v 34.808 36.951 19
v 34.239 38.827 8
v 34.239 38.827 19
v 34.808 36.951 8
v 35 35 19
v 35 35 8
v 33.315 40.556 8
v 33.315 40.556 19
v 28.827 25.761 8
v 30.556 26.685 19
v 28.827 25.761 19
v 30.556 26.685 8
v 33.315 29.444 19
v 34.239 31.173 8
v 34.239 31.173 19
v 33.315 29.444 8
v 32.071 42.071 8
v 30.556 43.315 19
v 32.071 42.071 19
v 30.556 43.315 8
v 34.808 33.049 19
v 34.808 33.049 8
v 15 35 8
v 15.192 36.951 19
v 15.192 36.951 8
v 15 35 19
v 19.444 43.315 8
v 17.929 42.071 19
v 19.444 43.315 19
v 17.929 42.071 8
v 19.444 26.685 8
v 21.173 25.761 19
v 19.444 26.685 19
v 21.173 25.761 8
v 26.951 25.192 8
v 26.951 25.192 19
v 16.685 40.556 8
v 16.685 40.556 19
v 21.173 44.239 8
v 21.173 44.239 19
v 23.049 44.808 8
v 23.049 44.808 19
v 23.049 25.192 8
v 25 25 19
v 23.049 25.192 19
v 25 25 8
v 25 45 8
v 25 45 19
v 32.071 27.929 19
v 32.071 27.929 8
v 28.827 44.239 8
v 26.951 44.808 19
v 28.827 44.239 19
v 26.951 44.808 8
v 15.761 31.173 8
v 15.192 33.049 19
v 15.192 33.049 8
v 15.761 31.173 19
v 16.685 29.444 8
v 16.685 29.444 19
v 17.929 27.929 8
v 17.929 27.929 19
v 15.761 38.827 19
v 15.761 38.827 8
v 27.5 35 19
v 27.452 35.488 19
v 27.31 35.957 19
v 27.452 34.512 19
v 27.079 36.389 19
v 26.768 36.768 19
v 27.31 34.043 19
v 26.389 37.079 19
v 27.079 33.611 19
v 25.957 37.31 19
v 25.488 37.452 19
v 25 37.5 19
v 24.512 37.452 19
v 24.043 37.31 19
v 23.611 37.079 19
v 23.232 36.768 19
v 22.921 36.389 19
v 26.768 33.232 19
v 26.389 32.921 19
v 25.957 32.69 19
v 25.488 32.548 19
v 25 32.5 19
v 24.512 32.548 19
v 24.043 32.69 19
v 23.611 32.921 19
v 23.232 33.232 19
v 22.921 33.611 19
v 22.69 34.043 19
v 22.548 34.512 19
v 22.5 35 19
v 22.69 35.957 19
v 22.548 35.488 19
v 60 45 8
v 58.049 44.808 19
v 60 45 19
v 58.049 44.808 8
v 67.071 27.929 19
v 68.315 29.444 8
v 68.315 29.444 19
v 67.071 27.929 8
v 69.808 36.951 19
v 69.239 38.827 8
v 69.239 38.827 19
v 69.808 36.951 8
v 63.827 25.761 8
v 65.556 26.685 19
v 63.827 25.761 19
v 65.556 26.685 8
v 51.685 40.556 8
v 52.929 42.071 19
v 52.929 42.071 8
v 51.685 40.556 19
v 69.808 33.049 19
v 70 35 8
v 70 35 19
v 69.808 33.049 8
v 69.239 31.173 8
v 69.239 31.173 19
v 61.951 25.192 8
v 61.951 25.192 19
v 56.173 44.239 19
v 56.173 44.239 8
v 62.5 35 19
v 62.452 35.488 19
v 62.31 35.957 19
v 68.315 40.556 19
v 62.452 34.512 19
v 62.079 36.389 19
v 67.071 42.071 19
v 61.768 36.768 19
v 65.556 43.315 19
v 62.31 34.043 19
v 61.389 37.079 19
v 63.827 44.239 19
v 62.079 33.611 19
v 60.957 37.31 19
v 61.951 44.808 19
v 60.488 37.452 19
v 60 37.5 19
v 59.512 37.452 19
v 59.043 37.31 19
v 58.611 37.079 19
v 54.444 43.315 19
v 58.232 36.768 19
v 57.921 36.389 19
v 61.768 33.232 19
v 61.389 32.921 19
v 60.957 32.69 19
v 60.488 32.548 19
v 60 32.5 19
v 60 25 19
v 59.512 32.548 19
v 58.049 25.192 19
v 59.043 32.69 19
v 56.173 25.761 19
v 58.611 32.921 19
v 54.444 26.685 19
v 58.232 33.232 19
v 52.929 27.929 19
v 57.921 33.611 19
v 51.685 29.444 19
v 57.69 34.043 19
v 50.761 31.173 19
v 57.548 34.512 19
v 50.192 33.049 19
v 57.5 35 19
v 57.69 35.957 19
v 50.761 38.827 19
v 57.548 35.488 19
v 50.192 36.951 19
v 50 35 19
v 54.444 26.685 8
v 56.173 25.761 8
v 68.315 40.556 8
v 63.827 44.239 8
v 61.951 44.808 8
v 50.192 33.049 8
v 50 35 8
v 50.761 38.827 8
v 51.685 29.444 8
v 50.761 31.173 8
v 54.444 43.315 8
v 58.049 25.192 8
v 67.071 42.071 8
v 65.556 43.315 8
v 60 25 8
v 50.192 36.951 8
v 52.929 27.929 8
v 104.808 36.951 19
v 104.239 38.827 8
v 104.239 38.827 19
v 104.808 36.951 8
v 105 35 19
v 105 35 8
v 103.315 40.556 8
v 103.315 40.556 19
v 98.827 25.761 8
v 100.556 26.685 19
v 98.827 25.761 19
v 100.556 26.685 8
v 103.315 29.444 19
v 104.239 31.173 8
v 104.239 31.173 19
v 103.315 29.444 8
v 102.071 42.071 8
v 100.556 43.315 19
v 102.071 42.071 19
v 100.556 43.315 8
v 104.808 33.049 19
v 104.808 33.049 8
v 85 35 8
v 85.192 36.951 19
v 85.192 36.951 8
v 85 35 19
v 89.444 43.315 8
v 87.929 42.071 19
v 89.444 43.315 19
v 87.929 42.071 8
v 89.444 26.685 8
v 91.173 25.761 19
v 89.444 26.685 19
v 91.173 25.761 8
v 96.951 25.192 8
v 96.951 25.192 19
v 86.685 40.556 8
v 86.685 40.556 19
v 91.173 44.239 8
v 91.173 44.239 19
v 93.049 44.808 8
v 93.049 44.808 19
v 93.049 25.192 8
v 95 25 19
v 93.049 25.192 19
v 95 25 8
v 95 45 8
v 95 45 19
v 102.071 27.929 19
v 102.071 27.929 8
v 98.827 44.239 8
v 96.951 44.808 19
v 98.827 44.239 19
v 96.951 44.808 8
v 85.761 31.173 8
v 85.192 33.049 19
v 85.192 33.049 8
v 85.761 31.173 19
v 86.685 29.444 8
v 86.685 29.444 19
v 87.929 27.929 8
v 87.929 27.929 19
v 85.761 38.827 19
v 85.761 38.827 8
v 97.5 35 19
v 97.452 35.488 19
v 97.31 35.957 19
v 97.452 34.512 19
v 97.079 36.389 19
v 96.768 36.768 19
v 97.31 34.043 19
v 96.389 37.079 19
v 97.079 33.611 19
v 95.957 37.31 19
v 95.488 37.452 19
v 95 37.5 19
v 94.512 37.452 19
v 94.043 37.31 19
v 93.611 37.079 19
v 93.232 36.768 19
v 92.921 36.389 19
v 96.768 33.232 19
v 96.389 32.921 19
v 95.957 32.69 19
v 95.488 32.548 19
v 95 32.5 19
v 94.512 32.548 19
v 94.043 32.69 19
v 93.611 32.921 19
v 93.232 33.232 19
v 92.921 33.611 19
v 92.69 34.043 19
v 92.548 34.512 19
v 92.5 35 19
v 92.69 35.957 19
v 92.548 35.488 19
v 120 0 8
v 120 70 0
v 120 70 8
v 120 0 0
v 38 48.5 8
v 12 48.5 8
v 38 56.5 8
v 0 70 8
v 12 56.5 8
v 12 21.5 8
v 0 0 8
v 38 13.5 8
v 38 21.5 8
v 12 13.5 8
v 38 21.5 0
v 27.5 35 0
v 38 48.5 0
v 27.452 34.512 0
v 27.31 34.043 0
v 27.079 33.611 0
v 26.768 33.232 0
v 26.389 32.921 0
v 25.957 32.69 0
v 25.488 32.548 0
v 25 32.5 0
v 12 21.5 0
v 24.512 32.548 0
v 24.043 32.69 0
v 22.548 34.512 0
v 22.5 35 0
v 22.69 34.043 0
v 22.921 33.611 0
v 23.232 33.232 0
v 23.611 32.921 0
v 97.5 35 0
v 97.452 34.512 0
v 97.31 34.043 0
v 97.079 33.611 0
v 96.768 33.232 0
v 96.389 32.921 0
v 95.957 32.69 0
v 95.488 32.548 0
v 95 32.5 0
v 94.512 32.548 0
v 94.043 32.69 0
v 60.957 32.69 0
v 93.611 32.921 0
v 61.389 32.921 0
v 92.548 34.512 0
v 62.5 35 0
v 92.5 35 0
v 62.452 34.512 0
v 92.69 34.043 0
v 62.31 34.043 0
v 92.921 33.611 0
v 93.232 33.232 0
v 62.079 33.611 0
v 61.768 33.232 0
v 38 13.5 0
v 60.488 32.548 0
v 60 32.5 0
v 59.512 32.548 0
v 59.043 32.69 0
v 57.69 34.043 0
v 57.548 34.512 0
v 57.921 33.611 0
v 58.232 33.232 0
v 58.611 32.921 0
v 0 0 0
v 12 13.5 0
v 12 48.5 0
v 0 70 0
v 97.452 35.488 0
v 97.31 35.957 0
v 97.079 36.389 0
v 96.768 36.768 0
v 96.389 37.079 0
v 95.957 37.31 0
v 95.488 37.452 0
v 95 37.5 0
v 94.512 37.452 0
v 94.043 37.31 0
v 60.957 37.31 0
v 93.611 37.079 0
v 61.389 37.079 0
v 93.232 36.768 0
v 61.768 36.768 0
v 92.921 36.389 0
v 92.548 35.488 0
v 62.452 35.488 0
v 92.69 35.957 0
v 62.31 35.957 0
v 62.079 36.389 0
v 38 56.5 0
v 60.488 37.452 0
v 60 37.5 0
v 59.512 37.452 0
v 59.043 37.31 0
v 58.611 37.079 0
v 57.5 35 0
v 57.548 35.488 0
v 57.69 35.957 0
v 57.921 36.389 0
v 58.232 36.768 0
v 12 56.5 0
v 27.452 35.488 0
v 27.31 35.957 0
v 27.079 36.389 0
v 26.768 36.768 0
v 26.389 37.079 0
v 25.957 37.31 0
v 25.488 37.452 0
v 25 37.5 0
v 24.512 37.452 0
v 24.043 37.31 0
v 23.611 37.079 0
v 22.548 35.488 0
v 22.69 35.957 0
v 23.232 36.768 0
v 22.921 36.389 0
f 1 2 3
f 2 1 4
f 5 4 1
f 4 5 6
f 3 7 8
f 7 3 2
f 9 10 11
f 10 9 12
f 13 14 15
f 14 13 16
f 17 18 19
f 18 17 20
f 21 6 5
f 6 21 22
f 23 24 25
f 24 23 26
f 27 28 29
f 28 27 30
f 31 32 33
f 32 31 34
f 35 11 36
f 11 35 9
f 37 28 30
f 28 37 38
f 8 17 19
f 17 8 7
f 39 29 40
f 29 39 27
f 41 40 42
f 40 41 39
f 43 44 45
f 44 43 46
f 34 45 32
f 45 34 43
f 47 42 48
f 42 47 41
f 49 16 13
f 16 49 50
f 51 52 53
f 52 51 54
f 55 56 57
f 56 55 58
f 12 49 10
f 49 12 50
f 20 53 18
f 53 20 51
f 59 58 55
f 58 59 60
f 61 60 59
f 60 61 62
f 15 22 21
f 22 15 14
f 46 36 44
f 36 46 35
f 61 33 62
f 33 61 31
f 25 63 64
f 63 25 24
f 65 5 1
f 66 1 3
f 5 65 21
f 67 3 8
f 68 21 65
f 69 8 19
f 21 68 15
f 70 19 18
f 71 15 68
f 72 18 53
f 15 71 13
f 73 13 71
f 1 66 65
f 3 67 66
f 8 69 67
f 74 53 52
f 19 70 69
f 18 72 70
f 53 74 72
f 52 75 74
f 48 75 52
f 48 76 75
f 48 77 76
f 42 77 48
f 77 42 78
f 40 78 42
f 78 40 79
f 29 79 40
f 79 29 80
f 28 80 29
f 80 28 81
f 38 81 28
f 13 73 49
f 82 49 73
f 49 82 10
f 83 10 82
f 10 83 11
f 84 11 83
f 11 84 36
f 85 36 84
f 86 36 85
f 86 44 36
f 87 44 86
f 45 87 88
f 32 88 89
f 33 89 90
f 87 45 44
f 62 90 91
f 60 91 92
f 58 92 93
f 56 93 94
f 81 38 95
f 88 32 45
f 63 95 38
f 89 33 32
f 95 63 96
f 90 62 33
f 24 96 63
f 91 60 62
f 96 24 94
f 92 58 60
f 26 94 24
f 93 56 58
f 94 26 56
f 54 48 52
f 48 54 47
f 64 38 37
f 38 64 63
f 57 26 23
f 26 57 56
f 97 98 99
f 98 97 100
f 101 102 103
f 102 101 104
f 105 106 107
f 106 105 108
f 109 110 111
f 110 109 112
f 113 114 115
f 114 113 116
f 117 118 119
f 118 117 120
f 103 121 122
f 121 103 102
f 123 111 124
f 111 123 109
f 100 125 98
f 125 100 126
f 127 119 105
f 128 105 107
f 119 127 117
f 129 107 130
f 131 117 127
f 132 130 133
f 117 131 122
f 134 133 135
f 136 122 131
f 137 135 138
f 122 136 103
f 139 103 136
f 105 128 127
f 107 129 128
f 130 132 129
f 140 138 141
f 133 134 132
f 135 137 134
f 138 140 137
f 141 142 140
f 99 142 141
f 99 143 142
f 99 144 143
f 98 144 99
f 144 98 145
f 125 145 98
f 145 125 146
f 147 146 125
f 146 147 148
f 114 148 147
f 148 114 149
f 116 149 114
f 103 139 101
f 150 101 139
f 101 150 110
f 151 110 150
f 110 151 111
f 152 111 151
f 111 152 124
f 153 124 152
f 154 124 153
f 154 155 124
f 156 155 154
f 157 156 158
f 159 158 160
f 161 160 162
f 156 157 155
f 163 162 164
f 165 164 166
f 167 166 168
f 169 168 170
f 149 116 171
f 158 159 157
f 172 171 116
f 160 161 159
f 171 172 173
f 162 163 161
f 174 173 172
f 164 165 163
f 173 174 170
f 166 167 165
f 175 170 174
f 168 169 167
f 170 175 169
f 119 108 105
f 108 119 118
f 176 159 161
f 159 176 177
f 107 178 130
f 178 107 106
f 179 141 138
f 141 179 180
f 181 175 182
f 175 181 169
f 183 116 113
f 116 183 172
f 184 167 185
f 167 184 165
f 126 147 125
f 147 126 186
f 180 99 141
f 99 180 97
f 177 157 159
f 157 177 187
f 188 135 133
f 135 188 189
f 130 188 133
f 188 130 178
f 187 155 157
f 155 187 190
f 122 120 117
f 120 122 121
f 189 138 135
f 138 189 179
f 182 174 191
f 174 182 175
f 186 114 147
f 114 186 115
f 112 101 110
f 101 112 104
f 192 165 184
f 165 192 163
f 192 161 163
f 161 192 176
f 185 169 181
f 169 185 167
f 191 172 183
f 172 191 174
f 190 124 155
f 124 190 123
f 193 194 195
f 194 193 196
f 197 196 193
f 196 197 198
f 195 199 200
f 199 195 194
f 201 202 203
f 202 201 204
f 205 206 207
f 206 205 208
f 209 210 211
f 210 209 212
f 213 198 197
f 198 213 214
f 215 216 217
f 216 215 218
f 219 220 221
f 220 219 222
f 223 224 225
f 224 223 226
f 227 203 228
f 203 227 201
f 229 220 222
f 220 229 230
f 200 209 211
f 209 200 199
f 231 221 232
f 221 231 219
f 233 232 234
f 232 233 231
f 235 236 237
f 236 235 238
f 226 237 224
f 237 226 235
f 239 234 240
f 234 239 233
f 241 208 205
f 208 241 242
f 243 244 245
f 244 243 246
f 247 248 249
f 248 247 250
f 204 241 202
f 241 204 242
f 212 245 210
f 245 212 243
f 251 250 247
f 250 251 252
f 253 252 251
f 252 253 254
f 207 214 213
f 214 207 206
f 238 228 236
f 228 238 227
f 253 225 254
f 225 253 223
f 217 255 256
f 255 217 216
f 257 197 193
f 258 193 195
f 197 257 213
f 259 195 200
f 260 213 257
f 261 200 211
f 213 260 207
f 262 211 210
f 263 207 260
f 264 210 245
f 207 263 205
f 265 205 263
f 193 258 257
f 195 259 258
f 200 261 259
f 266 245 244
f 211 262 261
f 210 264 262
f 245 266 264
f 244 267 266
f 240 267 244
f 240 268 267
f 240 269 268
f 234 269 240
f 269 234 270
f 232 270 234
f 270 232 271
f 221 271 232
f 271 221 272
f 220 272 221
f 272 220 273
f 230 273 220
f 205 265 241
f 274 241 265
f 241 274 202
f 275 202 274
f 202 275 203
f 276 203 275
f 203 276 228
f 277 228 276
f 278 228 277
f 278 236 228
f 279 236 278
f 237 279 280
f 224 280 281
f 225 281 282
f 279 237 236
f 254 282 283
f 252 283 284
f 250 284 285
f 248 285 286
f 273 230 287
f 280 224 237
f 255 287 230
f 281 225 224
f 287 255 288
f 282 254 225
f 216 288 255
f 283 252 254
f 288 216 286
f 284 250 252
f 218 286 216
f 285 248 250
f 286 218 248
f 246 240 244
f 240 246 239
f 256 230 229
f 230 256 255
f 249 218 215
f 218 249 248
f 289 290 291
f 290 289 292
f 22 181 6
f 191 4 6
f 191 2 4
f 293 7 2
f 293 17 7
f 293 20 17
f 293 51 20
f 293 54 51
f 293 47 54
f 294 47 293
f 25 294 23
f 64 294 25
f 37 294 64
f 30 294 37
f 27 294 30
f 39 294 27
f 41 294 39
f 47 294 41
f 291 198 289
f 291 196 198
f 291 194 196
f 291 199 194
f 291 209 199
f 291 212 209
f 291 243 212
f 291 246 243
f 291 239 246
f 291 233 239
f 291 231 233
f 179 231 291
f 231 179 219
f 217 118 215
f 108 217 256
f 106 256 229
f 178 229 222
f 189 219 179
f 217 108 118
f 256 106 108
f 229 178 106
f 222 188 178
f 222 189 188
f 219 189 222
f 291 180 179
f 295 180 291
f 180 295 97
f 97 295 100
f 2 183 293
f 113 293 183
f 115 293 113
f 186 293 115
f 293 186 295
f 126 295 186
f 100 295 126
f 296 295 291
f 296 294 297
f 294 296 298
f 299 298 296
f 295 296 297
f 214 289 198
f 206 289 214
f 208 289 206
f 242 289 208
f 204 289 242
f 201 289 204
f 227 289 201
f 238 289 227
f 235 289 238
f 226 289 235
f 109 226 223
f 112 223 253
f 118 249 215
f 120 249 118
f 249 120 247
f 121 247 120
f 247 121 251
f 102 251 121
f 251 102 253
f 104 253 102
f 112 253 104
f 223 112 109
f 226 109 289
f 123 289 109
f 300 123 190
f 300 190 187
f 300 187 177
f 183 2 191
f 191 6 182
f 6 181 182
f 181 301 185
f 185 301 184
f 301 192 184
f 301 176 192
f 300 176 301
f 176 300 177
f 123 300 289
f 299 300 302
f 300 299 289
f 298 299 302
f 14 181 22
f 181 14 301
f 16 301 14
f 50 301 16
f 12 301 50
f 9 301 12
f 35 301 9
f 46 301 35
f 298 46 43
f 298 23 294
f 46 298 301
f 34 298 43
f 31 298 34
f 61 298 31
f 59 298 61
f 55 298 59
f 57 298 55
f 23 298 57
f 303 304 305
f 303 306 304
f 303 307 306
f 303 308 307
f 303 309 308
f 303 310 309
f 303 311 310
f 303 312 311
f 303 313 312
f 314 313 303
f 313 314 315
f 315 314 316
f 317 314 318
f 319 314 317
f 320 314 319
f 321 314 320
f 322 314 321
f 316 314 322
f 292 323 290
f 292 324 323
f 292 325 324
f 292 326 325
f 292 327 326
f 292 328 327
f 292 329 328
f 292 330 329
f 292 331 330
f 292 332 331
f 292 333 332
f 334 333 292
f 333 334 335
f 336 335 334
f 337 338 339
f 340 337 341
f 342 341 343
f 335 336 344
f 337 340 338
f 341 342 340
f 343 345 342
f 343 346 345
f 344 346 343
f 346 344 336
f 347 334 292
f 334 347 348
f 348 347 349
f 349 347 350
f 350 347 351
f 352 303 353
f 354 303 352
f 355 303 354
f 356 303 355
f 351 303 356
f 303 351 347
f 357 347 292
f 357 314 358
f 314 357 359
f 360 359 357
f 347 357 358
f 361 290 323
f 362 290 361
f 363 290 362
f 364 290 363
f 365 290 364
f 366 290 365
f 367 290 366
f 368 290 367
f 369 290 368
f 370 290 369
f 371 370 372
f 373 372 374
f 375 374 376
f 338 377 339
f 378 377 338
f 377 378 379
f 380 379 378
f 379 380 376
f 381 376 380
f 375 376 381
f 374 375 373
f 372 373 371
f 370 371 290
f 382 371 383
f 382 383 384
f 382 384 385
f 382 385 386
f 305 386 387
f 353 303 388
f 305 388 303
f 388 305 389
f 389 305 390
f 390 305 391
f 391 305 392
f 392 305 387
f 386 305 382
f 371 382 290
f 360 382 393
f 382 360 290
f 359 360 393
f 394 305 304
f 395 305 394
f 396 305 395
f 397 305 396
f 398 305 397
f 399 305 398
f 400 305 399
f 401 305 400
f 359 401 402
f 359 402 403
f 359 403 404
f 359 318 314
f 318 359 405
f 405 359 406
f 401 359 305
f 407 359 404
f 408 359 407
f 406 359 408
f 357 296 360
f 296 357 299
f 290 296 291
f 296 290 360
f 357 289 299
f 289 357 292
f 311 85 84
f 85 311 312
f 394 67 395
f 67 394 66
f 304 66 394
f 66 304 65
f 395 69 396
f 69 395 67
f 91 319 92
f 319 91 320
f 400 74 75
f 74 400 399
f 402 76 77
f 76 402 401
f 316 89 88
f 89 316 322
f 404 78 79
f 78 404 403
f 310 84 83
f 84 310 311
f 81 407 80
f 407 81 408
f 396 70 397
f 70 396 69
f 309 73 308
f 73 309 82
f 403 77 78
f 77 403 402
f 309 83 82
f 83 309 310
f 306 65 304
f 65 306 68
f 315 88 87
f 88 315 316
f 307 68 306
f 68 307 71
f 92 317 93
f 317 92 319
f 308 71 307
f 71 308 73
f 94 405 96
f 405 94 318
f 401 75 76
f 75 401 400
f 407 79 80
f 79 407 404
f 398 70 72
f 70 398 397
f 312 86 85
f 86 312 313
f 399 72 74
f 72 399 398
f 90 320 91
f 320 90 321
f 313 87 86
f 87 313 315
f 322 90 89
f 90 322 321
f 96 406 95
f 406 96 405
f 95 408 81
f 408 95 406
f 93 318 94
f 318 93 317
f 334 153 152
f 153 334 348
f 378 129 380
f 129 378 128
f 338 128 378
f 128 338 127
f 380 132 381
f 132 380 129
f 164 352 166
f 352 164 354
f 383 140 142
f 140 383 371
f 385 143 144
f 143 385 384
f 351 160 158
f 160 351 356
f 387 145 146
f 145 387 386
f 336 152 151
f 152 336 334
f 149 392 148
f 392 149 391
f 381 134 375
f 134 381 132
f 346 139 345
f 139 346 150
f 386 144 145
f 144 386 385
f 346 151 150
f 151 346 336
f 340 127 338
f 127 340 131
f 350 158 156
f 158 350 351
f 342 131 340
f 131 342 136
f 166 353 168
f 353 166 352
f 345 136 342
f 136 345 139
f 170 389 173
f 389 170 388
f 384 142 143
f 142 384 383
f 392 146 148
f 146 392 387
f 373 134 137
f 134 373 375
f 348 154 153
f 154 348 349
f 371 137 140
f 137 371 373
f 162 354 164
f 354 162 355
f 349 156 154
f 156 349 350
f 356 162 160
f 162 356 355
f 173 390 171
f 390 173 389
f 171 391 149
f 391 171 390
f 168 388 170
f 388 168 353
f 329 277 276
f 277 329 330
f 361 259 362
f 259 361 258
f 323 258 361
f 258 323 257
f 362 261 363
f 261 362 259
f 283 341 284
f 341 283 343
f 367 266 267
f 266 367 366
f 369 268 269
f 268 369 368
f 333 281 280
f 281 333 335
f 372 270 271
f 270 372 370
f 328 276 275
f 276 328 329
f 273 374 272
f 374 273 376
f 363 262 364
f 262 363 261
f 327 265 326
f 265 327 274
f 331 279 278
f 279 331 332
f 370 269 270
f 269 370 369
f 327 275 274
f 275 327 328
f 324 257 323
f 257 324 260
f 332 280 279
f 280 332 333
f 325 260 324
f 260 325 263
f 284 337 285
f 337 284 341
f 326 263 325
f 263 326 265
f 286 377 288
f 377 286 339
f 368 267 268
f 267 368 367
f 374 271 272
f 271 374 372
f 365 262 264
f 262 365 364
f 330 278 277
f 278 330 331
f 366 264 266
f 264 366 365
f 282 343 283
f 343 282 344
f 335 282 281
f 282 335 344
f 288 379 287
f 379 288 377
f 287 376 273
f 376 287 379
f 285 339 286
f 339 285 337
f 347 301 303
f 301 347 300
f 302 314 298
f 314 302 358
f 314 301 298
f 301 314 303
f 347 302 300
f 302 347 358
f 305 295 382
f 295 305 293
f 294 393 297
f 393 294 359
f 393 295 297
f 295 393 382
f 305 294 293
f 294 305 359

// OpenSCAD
$fn = 32;

// ----------------------------------------------------------------------
// Drill jig: three_boss_slot jig
// ----------------------------------------------------------------------

// --- parameters (mm) ---
plate_l = 120;            // plate length, X
plate_w = 70;             // plate width, Y
plate_t = 8;              // plate thickness
boss_d = 20;              // guide boss diameter
boss_h = 12;              // boss height above the plate
guide_d = 5;              // guide hole diameter
boss_pitch = 35;          // boss pitch
slot_w = 8;               // clamp slot width
slot_l = 26;              // clamp slot length
slot_x = 12;              // slot start X

n_boss = 3;  // guide bosses
boss_x0 = (plate_l - (n_boss - 1) * boss_pitch) / 2;  // first boss X
boss_top = plate_t - 1 + boss_h;  // boss crown height
total_h = boss_top;  // overall height

difference() {
  union() {
  cube([plate_l, plate_w, plate_t]);
  for (i = [0 : n_boss - 1])
    translate([boss_x0 + i * boss_pitch, plate_w / 2, plate_t - 1])
      cylinder(h = boss_h, d = boss_d);
  }
  for (i = [0 : n_boss - 1])
    translate([boss_x0 + i * boss_pitch, plate_w / 2, -1])
      cylinder(h = plate_t + boss_h, d = guide_d);
  for (cy = [plate_w * 0.25, plate_w * 0.75])
    translate([slot_x, cy - slot_w / 2, -1])
      cube([slot_l, slot_w, plate_t + 2]);
}
